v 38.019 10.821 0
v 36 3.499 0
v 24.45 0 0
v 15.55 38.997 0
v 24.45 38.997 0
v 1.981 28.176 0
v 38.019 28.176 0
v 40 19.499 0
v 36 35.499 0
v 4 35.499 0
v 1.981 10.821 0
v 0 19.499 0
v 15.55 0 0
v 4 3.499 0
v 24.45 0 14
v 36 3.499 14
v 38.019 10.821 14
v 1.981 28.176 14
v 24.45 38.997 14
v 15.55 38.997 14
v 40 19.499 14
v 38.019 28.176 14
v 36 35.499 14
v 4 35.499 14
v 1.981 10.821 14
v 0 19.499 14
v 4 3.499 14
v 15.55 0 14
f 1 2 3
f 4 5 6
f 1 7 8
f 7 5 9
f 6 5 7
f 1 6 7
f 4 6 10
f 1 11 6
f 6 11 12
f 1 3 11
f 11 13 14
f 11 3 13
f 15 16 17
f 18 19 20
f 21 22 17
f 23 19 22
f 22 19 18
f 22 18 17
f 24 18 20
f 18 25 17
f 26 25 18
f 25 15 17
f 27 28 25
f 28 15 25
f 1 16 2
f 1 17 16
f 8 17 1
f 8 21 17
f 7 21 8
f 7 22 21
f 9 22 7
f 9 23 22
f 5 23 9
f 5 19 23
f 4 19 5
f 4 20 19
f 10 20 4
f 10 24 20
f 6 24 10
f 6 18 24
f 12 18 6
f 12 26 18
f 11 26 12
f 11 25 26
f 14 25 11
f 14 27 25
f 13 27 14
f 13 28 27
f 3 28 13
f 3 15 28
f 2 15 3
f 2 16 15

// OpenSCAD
$fn = 32;

// ----------------------------------------------------------------------
// Flat adaptor: hex_disc, 14 mm thick
// ----------------------------------------------------------------------

// --- parameters (mm) ---
profile_height = 14;      // extrusion height
profile_points = 14;      // points of the closed outline

profile = [[0, 19.499], [1.981, 10.821], [4, 3.499], [15.55, 0], [24.45, 0], [36, 3.499], [38.019, 10.821], [40, 19.499], [38.019, 28.176], [36, 35.499], [24.45, 38.997], [15.55, 38.997], [4, 35.499], [1.981, 28.176]];  // single closed polygon, 14 points, counter clockwise

// --- the one profile operation ---
linear_extrude(height = profile_height) polygon(points = profile);
